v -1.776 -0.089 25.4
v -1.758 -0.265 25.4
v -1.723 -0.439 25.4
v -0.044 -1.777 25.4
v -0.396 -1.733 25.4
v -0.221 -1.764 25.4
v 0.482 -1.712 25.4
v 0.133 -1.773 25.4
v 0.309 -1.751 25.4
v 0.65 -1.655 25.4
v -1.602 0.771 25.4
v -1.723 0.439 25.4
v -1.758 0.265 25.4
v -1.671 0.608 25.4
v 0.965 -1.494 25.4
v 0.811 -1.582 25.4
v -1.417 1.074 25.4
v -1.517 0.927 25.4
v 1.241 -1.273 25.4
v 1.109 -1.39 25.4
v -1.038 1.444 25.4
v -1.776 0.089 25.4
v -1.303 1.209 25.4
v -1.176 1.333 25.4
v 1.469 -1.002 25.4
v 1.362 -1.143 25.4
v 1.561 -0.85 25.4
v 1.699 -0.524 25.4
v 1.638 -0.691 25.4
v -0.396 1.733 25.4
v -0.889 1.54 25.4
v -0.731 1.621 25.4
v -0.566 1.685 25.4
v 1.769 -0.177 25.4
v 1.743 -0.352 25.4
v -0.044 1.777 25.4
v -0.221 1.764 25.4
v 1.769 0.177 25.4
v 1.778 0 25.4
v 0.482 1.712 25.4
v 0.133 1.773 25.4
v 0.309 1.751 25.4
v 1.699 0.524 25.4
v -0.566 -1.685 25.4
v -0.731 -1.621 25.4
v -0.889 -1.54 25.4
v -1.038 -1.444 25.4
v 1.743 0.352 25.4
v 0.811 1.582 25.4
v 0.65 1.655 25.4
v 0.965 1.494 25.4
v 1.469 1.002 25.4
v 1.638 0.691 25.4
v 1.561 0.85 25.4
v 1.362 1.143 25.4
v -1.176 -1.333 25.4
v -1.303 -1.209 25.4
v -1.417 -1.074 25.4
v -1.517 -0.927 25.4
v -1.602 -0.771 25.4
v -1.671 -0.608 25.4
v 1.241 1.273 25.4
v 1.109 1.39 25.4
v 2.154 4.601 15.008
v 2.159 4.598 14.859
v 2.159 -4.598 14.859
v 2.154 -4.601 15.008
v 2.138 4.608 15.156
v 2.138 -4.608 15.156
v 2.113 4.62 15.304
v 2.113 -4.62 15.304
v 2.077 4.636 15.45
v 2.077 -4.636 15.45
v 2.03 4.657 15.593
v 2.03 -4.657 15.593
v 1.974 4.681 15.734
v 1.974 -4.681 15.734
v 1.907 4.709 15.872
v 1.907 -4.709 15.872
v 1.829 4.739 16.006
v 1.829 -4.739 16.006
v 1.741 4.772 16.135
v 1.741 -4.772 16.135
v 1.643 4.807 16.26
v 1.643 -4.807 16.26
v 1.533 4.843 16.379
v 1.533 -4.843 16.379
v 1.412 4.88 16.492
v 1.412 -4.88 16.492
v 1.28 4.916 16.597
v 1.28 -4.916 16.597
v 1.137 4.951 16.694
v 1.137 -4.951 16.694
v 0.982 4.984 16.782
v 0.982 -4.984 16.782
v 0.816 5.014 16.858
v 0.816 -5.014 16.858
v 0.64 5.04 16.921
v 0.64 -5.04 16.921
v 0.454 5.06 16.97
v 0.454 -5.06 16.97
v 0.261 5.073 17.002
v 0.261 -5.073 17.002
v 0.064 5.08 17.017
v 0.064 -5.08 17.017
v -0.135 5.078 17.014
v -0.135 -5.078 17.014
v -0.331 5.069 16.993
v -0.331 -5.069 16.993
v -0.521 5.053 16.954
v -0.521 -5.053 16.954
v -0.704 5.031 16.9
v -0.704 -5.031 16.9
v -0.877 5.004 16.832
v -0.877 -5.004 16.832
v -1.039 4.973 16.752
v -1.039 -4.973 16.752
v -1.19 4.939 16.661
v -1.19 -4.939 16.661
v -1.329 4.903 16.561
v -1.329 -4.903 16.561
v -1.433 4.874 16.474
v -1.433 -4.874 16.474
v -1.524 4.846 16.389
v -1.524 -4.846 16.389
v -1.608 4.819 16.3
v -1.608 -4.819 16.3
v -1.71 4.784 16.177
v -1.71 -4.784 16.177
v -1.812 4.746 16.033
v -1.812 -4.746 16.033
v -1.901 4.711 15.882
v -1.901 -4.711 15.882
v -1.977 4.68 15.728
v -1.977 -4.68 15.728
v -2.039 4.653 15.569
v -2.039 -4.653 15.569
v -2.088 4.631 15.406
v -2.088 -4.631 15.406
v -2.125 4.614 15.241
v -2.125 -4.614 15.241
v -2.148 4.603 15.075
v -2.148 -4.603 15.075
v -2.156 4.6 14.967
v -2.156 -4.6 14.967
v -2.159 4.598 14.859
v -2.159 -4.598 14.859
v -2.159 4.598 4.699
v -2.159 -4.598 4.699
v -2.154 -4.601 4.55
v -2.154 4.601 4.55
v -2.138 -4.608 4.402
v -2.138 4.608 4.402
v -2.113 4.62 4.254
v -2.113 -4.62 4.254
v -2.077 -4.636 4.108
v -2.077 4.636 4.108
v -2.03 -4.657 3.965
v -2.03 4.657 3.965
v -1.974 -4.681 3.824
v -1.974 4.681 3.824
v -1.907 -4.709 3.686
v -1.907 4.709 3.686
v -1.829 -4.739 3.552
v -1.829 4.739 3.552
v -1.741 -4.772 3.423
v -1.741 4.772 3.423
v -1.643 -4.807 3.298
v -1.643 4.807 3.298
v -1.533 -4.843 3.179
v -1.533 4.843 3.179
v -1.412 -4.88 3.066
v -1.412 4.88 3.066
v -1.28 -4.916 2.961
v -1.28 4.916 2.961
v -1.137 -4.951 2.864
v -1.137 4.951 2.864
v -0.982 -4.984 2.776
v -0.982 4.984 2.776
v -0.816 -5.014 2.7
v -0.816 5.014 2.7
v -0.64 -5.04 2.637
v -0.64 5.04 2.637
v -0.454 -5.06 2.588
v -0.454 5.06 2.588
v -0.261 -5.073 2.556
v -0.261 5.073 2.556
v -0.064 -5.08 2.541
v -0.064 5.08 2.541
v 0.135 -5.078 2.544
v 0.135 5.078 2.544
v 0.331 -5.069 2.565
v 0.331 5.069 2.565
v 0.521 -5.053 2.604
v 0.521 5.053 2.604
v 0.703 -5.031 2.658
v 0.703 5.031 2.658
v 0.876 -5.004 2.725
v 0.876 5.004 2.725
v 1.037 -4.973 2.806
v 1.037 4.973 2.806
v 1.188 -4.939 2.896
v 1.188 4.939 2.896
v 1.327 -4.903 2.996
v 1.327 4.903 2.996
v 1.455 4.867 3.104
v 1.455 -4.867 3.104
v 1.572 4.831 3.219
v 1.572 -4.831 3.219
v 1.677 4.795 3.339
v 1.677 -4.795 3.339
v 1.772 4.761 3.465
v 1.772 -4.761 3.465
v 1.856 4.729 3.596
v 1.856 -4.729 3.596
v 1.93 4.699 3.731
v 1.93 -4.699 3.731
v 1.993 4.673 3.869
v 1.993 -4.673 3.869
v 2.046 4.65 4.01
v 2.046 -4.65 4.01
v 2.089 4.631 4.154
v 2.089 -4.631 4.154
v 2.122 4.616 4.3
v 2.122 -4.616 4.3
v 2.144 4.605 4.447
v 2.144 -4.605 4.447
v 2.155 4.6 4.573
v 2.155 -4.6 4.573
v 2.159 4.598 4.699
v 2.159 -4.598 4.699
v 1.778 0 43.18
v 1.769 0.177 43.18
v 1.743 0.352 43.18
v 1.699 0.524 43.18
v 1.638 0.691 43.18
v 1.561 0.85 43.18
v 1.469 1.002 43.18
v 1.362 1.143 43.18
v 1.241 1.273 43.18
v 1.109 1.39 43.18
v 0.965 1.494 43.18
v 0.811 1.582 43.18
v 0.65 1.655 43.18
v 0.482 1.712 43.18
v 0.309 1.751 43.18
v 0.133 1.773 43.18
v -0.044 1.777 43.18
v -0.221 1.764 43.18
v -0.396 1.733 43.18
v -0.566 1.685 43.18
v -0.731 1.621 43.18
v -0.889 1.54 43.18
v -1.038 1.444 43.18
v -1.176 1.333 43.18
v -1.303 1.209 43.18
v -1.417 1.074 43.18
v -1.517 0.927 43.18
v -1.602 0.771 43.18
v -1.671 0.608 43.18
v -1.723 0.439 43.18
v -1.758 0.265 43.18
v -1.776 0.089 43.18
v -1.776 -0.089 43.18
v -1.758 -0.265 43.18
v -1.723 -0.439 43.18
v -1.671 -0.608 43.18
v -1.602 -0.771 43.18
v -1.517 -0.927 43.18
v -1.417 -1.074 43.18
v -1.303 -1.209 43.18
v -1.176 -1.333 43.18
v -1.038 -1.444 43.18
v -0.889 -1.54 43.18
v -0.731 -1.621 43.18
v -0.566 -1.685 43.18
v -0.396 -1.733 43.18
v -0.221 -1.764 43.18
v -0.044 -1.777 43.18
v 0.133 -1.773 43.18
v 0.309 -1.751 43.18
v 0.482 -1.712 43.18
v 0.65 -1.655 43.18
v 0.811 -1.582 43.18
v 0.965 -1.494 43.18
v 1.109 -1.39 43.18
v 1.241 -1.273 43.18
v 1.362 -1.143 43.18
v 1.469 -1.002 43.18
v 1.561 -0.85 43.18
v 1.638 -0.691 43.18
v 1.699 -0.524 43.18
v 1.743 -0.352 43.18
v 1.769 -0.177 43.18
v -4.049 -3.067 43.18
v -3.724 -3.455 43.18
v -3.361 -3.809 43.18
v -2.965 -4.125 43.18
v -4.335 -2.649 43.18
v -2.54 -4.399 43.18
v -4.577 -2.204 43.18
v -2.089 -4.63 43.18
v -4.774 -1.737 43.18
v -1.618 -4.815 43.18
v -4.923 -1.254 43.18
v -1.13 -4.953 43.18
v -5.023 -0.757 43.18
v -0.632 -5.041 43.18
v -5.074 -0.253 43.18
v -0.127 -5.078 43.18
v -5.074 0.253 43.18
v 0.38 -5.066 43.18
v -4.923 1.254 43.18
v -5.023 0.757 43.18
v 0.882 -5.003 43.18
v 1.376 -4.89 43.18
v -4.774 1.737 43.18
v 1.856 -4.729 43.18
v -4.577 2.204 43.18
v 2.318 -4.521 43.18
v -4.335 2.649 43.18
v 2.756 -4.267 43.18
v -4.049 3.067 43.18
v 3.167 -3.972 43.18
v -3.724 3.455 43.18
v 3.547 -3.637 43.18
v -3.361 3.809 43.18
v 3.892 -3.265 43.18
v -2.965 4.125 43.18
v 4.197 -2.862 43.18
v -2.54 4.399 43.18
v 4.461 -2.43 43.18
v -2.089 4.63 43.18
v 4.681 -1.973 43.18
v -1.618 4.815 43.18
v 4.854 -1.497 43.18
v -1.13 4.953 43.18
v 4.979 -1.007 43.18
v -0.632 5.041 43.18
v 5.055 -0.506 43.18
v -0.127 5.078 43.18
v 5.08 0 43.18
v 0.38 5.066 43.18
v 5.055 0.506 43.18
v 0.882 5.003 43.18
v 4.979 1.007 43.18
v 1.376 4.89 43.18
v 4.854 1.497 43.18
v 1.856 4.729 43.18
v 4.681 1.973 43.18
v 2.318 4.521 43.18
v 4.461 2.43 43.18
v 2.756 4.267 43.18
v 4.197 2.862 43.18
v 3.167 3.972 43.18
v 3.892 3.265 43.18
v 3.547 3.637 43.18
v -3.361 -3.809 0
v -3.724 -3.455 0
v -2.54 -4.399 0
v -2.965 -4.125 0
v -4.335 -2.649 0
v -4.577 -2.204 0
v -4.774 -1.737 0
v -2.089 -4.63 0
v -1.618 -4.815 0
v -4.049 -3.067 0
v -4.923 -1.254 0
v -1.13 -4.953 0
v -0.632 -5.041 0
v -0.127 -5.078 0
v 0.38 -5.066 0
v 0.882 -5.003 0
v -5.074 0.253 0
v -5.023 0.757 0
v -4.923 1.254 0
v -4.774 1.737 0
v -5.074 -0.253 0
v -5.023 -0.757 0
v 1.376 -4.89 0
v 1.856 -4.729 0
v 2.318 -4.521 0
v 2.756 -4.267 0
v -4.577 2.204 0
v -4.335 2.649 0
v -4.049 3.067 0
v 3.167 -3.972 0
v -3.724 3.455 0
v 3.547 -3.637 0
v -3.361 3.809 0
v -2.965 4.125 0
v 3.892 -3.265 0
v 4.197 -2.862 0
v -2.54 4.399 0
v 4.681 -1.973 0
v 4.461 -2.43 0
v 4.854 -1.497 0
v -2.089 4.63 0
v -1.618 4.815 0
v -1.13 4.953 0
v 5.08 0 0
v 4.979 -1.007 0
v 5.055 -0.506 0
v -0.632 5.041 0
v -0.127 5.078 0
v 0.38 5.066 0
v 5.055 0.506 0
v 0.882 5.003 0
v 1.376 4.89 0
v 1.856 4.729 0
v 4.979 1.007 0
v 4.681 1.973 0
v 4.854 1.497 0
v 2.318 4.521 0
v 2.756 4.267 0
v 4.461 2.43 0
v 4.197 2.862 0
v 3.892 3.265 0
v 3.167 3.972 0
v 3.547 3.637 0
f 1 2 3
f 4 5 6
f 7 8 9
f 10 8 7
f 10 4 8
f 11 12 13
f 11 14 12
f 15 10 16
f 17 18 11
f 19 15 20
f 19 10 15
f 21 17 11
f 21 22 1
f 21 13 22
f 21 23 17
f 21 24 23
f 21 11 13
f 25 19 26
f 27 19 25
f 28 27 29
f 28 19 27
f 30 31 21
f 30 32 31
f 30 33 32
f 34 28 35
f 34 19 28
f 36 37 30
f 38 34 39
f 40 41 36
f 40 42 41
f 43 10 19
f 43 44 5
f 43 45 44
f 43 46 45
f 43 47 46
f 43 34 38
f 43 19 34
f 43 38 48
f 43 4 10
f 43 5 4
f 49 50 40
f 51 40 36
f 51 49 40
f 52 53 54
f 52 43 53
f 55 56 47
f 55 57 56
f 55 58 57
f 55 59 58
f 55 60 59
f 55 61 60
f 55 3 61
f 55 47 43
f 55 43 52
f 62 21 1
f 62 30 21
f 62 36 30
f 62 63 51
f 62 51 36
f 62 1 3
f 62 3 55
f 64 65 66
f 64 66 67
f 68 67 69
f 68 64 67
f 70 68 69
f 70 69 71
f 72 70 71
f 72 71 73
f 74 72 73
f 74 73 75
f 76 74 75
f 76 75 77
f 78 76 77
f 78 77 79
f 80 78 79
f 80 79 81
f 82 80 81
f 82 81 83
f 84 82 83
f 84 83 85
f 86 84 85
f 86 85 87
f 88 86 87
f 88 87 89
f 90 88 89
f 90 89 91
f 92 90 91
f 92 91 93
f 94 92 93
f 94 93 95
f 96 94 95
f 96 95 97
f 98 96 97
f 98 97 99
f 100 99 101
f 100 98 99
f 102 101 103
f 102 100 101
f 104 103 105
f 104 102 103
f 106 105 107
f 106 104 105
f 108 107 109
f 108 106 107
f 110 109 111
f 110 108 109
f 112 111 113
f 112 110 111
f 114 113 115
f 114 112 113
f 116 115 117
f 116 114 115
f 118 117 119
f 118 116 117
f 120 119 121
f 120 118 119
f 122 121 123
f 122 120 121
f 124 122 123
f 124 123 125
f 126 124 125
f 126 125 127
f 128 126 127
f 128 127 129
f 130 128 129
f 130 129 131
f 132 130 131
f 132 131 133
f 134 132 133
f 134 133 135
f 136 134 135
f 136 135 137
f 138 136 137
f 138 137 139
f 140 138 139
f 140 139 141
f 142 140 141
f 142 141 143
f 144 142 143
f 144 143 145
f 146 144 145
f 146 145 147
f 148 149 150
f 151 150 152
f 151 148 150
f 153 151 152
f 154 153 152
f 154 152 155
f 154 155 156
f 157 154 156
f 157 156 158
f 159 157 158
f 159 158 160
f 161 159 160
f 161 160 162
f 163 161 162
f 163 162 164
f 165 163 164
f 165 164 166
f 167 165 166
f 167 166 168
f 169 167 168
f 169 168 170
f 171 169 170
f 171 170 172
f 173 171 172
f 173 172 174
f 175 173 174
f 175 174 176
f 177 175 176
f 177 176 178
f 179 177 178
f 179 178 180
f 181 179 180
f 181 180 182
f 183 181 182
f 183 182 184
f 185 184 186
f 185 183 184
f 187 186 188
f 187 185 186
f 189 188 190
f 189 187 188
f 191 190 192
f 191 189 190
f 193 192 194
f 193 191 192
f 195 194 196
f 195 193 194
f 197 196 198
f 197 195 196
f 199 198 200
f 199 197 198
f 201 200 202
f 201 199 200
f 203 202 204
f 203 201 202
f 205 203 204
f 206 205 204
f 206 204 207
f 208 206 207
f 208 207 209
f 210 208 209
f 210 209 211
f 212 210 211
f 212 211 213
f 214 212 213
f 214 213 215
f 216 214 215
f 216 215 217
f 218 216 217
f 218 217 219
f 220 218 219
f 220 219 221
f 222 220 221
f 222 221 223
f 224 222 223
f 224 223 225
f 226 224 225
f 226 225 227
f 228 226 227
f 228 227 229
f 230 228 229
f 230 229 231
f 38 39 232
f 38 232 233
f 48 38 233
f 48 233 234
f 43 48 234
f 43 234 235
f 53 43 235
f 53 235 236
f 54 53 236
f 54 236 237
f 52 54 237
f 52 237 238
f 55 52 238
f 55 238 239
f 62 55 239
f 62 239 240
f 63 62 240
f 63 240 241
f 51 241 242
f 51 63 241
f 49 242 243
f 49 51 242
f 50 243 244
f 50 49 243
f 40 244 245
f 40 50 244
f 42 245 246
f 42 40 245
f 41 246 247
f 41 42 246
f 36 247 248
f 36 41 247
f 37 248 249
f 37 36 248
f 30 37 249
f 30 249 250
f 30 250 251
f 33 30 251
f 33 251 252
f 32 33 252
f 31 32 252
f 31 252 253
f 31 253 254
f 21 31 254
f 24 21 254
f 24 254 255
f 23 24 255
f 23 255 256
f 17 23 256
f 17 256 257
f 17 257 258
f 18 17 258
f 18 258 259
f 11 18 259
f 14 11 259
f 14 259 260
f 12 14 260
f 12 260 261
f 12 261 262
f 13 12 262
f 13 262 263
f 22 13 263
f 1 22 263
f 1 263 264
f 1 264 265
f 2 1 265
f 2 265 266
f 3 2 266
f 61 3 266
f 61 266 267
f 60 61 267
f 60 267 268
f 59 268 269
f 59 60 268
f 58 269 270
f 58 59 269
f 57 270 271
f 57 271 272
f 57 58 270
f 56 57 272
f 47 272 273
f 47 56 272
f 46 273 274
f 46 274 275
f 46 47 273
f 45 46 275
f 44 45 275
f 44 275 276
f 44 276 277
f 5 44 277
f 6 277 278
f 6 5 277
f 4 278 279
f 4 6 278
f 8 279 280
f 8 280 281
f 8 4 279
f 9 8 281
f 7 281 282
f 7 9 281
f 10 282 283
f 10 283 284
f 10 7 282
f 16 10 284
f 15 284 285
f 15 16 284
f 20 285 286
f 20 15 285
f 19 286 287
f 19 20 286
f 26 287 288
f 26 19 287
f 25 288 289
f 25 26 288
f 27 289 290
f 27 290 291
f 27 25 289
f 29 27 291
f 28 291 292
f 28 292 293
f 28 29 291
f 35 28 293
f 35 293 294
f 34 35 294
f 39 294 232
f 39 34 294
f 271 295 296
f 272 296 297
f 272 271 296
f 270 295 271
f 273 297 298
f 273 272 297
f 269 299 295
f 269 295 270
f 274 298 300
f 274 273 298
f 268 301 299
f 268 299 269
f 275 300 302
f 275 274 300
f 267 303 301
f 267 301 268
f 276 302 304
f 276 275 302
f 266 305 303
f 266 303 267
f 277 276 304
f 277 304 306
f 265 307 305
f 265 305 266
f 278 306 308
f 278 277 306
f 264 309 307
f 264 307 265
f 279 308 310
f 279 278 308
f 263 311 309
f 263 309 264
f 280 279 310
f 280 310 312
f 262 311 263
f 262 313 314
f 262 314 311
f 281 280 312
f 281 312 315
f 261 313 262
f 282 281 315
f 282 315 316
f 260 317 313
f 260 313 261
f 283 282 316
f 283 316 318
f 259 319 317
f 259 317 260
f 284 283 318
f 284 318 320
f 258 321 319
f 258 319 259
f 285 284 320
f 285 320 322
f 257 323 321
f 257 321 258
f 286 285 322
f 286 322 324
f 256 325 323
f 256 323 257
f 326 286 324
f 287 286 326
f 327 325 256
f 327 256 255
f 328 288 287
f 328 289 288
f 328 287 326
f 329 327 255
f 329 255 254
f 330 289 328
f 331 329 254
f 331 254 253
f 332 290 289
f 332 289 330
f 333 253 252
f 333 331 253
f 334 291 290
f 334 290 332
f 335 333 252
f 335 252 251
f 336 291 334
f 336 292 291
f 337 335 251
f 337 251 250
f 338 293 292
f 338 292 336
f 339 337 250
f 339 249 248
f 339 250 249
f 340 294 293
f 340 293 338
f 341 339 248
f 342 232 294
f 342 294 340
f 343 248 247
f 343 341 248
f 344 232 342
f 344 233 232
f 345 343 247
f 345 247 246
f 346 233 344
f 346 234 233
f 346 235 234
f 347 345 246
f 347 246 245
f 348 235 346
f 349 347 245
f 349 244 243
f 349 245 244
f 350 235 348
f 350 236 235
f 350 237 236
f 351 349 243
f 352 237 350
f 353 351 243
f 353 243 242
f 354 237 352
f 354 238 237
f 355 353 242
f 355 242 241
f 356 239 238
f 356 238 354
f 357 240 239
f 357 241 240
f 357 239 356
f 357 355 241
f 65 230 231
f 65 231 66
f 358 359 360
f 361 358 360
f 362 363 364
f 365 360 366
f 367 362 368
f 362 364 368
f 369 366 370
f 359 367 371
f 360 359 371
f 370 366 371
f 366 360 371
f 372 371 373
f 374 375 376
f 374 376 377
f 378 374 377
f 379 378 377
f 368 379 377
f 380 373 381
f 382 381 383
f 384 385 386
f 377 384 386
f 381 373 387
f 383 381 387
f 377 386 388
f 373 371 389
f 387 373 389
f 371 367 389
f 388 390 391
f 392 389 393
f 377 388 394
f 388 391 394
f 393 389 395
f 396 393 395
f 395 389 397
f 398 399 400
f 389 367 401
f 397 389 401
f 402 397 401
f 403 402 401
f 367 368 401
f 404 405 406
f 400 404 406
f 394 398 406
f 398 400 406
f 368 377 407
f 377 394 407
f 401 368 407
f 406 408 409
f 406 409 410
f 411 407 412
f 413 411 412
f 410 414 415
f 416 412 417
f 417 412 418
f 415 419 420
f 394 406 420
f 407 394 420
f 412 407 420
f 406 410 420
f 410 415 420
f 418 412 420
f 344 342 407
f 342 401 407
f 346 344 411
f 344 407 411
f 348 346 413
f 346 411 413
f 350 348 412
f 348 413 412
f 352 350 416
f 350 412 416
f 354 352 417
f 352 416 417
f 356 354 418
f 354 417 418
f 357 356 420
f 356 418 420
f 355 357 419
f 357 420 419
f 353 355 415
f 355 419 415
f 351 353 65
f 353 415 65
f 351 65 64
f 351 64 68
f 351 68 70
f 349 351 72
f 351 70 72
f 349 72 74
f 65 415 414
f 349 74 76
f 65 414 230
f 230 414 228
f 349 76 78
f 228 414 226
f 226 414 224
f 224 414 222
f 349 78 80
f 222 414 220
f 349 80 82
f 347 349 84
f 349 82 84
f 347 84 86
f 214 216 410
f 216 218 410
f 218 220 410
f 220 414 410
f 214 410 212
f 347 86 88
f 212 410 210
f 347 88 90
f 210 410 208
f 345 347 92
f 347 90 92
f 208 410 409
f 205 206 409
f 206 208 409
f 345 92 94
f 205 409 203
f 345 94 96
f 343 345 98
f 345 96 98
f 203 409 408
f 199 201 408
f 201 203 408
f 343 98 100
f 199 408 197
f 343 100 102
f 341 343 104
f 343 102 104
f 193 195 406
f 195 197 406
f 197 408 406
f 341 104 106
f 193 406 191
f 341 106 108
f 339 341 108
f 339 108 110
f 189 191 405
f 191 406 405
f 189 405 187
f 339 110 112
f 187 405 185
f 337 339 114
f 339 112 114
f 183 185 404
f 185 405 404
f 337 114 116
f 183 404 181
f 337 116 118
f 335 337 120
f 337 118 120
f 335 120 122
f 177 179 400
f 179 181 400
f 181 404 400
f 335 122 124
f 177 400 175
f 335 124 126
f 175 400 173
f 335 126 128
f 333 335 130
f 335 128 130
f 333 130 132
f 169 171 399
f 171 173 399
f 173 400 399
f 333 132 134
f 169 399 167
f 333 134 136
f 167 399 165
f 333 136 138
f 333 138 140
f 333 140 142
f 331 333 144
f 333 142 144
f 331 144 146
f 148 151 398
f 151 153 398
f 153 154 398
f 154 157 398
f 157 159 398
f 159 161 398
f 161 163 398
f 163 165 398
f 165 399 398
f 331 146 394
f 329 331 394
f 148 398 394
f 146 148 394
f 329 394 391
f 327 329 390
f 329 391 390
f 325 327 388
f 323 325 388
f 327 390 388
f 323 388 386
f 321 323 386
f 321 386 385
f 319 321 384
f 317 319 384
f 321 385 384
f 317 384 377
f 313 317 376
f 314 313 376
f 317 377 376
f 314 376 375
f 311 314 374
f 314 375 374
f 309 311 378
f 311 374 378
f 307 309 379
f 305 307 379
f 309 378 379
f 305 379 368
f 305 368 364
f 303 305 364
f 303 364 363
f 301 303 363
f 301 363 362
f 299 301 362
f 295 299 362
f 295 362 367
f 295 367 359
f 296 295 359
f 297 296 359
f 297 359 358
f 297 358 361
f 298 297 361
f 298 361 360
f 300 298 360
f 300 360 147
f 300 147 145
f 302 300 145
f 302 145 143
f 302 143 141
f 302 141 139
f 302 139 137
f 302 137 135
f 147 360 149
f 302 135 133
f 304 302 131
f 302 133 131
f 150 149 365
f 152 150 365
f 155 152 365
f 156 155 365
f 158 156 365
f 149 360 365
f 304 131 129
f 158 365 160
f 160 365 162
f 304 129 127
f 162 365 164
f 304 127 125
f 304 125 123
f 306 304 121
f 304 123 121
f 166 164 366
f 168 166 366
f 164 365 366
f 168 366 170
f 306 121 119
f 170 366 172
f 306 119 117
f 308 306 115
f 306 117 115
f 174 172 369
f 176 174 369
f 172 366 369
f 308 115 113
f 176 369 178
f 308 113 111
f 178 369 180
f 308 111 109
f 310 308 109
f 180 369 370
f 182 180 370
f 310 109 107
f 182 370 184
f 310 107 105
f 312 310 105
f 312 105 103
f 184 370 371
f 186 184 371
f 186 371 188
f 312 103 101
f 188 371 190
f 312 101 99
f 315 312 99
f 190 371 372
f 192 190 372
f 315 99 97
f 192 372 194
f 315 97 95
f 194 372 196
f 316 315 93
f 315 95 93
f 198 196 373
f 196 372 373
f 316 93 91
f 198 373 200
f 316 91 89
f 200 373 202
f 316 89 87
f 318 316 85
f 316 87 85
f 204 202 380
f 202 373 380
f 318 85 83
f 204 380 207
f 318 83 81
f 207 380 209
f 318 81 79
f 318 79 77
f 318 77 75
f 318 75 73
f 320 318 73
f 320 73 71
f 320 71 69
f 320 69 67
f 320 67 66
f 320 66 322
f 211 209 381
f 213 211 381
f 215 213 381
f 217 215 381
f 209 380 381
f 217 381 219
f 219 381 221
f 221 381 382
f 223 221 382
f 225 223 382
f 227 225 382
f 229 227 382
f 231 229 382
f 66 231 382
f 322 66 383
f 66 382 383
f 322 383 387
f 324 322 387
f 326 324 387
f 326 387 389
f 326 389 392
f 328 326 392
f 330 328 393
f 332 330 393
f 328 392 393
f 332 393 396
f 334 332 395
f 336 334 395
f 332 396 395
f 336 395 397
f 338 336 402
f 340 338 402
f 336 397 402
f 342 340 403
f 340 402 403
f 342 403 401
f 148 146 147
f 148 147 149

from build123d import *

# Parameters (mm, degrees)
F0_R          = 5.08
F0_R_2        = 1.778
F1_DEPTH      = 25.4
F2_DEPTH      = 43.18
F4_DEPTH      = 25.4
F4_DEPTH_BACK = 25.4


with BuildPart() as f1:
    # F0 (on Top) → F1 (new body)
    with BuildSketch(Plane.XY):
        Circle(F0_R)
        Circle(F0_R_2, mode=Mode.SUBTRACT)
        Circle(F0_R_2)
    extrude(amount=F1_DEPTH)

    # F0 (on Top) → F2 (join)
    with BuildSketch(Plane.XY):
        Circle(F0_R)
        Circle(F0_R_2, mode=Mode.SUBTRACT)
    extrude(amount=F2_DEPTH)

    # F3 (on Front) → F4 (cut, two sides)
    with BuildSketch(Plane.XZ) as f4_sk:
        with BuildLine():
            ThreePointArc((-2.159, 4.699), (0, 2.54), (2.159, 4.699))
            ThreePointArc((2.159, 4.699), (0, 6.858), (-2.159, 4.699))
        make_face()
        with BuildLine():
            ThreePointArc((-2.159, 4.699), (0, 6.858), (2.159, 4.699))
            Line((2.159, 4.699), (2.159, 14.859))
            ThreePointArc((2.159, 14.859), (0, 12.7), (-2.159, 14.859))
            Line((-2.159, 14.859), (-2.159, 4.699))
        make_face()
        with BuildLine():
            ThreePointArc((-2.159, 14.859), (0, 12.7), (2.159, 14.859))
            ThreePointArc((2.159, 14.859), (0, 17.018), (-2.159, 14.859))
        make_face()
    extrude(amount=-F4_DEPTH, mode=Mode.SUBTRACT)
    extrude(f4_sk.sketch, amount=F4_DEPTH_BACK, mode=Mode.SUBTRACT)


solid = f1.part
